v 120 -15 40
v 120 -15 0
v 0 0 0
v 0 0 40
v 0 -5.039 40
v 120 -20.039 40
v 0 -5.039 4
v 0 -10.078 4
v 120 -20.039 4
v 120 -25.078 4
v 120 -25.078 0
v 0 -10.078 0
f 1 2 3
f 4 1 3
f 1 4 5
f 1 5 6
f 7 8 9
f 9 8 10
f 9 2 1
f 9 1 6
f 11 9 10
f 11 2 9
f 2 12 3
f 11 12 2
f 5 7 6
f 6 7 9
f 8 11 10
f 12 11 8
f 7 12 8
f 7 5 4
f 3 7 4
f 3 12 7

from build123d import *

# Parameters (mm, degrees)
F1_DEPTH = 40
F3_DEPTH = 4


with BuildPart() as f1:
    # F0 (on Top) → F1 (new body)
    with BuildSketch(Plane.XY):
        Polygon((120, -20.038911), (120, -15), (0, 0), (0, -5.038911), align=None)
    extrude(amount=F1_DEPTH)

    # F2 (on face) → F3 (join)
    with BuildSketch(Plane(origin=(0, 0, 0), x_dir=(1, 0, 0), z_dir=(0, 0, -1))):
        Polygon((0, 10.077822), (0, 5.038911), (120, 20.038911), (120, 25.077822), align=None)
    extrude(amount=-F3_DEPTH)


solid = f1.part
